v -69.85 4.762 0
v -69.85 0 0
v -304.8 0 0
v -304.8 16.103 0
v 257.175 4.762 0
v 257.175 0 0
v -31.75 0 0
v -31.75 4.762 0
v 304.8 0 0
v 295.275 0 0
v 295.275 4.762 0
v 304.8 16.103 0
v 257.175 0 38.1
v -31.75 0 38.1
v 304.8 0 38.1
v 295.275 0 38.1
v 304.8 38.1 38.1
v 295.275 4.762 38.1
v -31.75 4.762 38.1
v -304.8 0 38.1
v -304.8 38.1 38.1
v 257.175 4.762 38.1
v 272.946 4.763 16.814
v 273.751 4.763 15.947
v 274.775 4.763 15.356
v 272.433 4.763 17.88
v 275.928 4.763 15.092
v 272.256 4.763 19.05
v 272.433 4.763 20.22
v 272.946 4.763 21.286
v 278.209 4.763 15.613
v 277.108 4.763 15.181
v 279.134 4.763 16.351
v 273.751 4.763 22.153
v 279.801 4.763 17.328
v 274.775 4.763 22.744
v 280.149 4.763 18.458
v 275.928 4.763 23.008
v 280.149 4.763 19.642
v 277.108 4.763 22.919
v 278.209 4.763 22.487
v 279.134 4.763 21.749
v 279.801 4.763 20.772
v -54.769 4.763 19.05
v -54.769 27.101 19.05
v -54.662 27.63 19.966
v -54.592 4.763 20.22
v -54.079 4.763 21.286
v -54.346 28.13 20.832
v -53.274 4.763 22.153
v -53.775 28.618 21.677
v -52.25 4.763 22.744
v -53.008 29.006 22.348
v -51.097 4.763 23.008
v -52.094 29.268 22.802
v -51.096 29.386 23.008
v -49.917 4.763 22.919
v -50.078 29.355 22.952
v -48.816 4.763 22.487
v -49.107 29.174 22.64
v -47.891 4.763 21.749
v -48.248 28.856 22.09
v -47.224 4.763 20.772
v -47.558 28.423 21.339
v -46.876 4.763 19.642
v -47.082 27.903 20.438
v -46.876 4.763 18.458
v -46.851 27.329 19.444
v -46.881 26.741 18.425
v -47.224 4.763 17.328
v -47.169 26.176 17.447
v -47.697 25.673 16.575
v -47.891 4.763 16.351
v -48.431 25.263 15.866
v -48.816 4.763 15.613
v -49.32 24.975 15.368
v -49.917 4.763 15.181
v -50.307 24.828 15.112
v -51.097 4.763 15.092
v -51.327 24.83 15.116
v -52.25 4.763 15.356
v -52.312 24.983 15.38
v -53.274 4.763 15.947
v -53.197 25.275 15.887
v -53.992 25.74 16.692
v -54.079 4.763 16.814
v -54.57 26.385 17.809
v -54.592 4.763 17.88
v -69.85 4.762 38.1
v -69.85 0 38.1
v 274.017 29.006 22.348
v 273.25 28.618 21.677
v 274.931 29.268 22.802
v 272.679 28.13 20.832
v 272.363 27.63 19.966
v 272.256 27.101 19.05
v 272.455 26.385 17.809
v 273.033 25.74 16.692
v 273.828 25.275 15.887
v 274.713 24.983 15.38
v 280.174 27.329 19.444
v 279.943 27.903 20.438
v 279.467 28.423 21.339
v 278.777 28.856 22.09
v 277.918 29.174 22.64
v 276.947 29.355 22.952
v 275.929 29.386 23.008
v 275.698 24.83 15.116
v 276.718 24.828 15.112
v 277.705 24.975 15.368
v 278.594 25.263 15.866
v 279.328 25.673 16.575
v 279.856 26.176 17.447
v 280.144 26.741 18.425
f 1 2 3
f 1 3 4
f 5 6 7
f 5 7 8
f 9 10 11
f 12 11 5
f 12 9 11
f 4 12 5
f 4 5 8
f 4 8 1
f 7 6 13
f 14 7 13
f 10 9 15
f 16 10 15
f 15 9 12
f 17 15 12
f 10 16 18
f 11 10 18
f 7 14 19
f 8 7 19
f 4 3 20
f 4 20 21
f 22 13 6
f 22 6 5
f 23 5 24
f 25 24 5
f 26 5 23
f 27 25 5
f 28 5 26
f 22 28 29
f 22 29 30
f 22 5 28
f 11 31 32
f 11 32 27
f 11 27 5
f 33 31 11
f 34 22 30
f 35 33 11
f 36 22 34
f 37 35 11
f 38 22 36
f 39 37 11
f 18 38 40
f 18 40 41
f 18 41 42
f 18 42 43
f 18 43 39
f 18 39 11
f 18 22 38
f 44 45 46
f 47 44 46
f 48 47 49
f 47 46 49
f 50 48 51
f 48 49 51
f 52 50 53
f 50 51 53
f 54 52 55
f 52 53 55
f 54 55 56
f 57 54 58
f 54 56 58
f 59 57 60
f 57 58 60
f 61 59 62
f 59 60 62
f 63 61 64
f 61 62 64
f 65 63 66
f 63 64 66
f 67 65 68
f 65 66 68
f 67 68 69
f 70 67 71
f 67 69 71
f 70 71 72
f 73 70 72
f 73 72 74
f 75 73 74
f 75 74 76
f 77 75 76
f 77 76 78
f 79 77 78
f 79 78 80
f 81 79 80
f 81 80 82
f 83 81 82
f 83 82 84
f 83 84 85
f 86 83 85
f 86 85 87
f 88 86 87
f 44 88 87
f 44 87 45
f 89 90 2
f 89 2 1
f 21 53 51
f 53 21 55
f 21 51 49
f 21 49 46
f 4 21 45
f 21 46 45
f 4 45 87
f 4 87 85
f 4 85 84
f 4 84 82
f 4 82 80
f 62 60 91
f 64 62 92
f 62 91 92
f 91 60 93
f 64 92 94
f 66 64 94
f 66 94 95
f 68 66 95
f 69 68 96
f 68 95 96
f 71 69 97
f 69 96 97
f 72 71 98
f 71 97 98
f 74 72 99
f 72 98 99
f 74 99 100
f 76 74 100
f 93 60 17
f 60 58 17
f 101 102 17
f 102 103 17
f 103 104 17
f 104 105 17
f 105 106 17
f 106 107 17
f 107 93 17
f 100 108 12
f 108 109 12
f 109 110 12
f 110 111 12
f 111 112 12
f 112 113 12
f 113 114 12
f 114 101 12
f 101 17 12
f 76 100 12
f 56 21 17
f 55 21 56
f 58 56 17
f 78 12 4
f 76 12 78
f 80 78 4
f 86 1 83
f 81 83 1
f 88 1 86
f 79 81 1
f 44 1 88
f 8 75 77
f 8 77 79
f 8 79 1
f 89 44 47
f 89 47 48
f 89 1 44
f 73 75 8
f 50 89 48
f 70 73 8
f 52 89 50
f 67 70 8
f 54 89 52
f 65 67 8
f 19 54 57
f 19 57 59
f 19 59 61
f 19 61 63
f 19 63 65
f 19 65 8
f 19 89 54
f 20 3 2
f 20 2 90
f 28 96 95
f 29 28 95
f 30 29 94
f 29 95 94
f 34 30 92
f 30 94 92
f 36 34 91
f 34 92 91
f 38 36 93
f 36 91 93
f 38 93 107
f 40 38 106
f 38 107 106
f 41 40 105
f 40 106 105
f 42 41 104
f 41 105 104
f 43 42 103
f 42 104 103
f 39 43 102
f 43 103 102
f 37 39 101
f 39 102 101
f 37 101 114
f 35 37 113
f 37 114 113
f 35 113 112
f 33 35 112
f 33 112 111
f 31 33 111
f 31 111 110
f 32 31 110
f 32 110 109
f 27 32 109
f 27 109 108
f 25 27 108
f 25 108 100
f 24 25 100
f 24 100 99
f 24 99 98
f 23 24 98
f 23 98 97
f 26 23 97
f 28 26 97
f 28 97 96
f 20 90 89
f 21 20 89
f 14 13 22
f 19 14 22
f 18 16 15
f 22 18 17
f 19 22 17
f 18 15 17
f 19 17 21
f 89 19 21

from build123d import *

# Parameters (mm, degrees)
F0_W          = 38.1
F0_H          = 38.1
F1_DEPTH      = 304.8
F1_DEPTH_BACK = 304.8
F2_W          = 38.1
F2_H          = 4.7625
F3_DEPTH      = 38.101
F5_D          = 7.9375
F7_DEPTH      = 609.601


with BuildPart() as f1:
    # F0 (on Right) → F1 (new body, two sides)
    with BuildSketch(Plane.YZ) as f1_sk:
        with Locations((19.05, 19.05)):
            Rectangle(F0_W, F0_H)
    extrude(amount=F1_DEPTH)
    extrude(f1_sk.sketch, amount=-F1_DEPTH_BACK)

    # F2 (on face) → F3 (cut, through all)
    with BuildSketch(Plane.XY.offset(38.1)):
        with Locations((-50.8, 2.38125)):
            Rectangle(F2_W, F2_H)
        with Locations((276.225, 2.38125)):
            Rectangle(F2_W, F2_H)
    extrude(amount=-F3_DEPTH, mode=Mode.SUBTRACT)

    # F5 (through all)
    with Locations(Plane.XZ.offset(-4.7625)):
        with Locations((-50.8, 19.05), (276.225, 19.05)):
            Hole(F5_D / 2)

    # F6 (on face) → F7 (cut, through all)
    with BuildSketch(Plane.YZ.offset(304.8)):
        Polygon((38.1, 0), (38.1, 38.1), (16.102955, 0), align=None)
    extrude(amount=-F7_DEPTH, mode=Mode.SUBTRACT)


solid = f1.part
